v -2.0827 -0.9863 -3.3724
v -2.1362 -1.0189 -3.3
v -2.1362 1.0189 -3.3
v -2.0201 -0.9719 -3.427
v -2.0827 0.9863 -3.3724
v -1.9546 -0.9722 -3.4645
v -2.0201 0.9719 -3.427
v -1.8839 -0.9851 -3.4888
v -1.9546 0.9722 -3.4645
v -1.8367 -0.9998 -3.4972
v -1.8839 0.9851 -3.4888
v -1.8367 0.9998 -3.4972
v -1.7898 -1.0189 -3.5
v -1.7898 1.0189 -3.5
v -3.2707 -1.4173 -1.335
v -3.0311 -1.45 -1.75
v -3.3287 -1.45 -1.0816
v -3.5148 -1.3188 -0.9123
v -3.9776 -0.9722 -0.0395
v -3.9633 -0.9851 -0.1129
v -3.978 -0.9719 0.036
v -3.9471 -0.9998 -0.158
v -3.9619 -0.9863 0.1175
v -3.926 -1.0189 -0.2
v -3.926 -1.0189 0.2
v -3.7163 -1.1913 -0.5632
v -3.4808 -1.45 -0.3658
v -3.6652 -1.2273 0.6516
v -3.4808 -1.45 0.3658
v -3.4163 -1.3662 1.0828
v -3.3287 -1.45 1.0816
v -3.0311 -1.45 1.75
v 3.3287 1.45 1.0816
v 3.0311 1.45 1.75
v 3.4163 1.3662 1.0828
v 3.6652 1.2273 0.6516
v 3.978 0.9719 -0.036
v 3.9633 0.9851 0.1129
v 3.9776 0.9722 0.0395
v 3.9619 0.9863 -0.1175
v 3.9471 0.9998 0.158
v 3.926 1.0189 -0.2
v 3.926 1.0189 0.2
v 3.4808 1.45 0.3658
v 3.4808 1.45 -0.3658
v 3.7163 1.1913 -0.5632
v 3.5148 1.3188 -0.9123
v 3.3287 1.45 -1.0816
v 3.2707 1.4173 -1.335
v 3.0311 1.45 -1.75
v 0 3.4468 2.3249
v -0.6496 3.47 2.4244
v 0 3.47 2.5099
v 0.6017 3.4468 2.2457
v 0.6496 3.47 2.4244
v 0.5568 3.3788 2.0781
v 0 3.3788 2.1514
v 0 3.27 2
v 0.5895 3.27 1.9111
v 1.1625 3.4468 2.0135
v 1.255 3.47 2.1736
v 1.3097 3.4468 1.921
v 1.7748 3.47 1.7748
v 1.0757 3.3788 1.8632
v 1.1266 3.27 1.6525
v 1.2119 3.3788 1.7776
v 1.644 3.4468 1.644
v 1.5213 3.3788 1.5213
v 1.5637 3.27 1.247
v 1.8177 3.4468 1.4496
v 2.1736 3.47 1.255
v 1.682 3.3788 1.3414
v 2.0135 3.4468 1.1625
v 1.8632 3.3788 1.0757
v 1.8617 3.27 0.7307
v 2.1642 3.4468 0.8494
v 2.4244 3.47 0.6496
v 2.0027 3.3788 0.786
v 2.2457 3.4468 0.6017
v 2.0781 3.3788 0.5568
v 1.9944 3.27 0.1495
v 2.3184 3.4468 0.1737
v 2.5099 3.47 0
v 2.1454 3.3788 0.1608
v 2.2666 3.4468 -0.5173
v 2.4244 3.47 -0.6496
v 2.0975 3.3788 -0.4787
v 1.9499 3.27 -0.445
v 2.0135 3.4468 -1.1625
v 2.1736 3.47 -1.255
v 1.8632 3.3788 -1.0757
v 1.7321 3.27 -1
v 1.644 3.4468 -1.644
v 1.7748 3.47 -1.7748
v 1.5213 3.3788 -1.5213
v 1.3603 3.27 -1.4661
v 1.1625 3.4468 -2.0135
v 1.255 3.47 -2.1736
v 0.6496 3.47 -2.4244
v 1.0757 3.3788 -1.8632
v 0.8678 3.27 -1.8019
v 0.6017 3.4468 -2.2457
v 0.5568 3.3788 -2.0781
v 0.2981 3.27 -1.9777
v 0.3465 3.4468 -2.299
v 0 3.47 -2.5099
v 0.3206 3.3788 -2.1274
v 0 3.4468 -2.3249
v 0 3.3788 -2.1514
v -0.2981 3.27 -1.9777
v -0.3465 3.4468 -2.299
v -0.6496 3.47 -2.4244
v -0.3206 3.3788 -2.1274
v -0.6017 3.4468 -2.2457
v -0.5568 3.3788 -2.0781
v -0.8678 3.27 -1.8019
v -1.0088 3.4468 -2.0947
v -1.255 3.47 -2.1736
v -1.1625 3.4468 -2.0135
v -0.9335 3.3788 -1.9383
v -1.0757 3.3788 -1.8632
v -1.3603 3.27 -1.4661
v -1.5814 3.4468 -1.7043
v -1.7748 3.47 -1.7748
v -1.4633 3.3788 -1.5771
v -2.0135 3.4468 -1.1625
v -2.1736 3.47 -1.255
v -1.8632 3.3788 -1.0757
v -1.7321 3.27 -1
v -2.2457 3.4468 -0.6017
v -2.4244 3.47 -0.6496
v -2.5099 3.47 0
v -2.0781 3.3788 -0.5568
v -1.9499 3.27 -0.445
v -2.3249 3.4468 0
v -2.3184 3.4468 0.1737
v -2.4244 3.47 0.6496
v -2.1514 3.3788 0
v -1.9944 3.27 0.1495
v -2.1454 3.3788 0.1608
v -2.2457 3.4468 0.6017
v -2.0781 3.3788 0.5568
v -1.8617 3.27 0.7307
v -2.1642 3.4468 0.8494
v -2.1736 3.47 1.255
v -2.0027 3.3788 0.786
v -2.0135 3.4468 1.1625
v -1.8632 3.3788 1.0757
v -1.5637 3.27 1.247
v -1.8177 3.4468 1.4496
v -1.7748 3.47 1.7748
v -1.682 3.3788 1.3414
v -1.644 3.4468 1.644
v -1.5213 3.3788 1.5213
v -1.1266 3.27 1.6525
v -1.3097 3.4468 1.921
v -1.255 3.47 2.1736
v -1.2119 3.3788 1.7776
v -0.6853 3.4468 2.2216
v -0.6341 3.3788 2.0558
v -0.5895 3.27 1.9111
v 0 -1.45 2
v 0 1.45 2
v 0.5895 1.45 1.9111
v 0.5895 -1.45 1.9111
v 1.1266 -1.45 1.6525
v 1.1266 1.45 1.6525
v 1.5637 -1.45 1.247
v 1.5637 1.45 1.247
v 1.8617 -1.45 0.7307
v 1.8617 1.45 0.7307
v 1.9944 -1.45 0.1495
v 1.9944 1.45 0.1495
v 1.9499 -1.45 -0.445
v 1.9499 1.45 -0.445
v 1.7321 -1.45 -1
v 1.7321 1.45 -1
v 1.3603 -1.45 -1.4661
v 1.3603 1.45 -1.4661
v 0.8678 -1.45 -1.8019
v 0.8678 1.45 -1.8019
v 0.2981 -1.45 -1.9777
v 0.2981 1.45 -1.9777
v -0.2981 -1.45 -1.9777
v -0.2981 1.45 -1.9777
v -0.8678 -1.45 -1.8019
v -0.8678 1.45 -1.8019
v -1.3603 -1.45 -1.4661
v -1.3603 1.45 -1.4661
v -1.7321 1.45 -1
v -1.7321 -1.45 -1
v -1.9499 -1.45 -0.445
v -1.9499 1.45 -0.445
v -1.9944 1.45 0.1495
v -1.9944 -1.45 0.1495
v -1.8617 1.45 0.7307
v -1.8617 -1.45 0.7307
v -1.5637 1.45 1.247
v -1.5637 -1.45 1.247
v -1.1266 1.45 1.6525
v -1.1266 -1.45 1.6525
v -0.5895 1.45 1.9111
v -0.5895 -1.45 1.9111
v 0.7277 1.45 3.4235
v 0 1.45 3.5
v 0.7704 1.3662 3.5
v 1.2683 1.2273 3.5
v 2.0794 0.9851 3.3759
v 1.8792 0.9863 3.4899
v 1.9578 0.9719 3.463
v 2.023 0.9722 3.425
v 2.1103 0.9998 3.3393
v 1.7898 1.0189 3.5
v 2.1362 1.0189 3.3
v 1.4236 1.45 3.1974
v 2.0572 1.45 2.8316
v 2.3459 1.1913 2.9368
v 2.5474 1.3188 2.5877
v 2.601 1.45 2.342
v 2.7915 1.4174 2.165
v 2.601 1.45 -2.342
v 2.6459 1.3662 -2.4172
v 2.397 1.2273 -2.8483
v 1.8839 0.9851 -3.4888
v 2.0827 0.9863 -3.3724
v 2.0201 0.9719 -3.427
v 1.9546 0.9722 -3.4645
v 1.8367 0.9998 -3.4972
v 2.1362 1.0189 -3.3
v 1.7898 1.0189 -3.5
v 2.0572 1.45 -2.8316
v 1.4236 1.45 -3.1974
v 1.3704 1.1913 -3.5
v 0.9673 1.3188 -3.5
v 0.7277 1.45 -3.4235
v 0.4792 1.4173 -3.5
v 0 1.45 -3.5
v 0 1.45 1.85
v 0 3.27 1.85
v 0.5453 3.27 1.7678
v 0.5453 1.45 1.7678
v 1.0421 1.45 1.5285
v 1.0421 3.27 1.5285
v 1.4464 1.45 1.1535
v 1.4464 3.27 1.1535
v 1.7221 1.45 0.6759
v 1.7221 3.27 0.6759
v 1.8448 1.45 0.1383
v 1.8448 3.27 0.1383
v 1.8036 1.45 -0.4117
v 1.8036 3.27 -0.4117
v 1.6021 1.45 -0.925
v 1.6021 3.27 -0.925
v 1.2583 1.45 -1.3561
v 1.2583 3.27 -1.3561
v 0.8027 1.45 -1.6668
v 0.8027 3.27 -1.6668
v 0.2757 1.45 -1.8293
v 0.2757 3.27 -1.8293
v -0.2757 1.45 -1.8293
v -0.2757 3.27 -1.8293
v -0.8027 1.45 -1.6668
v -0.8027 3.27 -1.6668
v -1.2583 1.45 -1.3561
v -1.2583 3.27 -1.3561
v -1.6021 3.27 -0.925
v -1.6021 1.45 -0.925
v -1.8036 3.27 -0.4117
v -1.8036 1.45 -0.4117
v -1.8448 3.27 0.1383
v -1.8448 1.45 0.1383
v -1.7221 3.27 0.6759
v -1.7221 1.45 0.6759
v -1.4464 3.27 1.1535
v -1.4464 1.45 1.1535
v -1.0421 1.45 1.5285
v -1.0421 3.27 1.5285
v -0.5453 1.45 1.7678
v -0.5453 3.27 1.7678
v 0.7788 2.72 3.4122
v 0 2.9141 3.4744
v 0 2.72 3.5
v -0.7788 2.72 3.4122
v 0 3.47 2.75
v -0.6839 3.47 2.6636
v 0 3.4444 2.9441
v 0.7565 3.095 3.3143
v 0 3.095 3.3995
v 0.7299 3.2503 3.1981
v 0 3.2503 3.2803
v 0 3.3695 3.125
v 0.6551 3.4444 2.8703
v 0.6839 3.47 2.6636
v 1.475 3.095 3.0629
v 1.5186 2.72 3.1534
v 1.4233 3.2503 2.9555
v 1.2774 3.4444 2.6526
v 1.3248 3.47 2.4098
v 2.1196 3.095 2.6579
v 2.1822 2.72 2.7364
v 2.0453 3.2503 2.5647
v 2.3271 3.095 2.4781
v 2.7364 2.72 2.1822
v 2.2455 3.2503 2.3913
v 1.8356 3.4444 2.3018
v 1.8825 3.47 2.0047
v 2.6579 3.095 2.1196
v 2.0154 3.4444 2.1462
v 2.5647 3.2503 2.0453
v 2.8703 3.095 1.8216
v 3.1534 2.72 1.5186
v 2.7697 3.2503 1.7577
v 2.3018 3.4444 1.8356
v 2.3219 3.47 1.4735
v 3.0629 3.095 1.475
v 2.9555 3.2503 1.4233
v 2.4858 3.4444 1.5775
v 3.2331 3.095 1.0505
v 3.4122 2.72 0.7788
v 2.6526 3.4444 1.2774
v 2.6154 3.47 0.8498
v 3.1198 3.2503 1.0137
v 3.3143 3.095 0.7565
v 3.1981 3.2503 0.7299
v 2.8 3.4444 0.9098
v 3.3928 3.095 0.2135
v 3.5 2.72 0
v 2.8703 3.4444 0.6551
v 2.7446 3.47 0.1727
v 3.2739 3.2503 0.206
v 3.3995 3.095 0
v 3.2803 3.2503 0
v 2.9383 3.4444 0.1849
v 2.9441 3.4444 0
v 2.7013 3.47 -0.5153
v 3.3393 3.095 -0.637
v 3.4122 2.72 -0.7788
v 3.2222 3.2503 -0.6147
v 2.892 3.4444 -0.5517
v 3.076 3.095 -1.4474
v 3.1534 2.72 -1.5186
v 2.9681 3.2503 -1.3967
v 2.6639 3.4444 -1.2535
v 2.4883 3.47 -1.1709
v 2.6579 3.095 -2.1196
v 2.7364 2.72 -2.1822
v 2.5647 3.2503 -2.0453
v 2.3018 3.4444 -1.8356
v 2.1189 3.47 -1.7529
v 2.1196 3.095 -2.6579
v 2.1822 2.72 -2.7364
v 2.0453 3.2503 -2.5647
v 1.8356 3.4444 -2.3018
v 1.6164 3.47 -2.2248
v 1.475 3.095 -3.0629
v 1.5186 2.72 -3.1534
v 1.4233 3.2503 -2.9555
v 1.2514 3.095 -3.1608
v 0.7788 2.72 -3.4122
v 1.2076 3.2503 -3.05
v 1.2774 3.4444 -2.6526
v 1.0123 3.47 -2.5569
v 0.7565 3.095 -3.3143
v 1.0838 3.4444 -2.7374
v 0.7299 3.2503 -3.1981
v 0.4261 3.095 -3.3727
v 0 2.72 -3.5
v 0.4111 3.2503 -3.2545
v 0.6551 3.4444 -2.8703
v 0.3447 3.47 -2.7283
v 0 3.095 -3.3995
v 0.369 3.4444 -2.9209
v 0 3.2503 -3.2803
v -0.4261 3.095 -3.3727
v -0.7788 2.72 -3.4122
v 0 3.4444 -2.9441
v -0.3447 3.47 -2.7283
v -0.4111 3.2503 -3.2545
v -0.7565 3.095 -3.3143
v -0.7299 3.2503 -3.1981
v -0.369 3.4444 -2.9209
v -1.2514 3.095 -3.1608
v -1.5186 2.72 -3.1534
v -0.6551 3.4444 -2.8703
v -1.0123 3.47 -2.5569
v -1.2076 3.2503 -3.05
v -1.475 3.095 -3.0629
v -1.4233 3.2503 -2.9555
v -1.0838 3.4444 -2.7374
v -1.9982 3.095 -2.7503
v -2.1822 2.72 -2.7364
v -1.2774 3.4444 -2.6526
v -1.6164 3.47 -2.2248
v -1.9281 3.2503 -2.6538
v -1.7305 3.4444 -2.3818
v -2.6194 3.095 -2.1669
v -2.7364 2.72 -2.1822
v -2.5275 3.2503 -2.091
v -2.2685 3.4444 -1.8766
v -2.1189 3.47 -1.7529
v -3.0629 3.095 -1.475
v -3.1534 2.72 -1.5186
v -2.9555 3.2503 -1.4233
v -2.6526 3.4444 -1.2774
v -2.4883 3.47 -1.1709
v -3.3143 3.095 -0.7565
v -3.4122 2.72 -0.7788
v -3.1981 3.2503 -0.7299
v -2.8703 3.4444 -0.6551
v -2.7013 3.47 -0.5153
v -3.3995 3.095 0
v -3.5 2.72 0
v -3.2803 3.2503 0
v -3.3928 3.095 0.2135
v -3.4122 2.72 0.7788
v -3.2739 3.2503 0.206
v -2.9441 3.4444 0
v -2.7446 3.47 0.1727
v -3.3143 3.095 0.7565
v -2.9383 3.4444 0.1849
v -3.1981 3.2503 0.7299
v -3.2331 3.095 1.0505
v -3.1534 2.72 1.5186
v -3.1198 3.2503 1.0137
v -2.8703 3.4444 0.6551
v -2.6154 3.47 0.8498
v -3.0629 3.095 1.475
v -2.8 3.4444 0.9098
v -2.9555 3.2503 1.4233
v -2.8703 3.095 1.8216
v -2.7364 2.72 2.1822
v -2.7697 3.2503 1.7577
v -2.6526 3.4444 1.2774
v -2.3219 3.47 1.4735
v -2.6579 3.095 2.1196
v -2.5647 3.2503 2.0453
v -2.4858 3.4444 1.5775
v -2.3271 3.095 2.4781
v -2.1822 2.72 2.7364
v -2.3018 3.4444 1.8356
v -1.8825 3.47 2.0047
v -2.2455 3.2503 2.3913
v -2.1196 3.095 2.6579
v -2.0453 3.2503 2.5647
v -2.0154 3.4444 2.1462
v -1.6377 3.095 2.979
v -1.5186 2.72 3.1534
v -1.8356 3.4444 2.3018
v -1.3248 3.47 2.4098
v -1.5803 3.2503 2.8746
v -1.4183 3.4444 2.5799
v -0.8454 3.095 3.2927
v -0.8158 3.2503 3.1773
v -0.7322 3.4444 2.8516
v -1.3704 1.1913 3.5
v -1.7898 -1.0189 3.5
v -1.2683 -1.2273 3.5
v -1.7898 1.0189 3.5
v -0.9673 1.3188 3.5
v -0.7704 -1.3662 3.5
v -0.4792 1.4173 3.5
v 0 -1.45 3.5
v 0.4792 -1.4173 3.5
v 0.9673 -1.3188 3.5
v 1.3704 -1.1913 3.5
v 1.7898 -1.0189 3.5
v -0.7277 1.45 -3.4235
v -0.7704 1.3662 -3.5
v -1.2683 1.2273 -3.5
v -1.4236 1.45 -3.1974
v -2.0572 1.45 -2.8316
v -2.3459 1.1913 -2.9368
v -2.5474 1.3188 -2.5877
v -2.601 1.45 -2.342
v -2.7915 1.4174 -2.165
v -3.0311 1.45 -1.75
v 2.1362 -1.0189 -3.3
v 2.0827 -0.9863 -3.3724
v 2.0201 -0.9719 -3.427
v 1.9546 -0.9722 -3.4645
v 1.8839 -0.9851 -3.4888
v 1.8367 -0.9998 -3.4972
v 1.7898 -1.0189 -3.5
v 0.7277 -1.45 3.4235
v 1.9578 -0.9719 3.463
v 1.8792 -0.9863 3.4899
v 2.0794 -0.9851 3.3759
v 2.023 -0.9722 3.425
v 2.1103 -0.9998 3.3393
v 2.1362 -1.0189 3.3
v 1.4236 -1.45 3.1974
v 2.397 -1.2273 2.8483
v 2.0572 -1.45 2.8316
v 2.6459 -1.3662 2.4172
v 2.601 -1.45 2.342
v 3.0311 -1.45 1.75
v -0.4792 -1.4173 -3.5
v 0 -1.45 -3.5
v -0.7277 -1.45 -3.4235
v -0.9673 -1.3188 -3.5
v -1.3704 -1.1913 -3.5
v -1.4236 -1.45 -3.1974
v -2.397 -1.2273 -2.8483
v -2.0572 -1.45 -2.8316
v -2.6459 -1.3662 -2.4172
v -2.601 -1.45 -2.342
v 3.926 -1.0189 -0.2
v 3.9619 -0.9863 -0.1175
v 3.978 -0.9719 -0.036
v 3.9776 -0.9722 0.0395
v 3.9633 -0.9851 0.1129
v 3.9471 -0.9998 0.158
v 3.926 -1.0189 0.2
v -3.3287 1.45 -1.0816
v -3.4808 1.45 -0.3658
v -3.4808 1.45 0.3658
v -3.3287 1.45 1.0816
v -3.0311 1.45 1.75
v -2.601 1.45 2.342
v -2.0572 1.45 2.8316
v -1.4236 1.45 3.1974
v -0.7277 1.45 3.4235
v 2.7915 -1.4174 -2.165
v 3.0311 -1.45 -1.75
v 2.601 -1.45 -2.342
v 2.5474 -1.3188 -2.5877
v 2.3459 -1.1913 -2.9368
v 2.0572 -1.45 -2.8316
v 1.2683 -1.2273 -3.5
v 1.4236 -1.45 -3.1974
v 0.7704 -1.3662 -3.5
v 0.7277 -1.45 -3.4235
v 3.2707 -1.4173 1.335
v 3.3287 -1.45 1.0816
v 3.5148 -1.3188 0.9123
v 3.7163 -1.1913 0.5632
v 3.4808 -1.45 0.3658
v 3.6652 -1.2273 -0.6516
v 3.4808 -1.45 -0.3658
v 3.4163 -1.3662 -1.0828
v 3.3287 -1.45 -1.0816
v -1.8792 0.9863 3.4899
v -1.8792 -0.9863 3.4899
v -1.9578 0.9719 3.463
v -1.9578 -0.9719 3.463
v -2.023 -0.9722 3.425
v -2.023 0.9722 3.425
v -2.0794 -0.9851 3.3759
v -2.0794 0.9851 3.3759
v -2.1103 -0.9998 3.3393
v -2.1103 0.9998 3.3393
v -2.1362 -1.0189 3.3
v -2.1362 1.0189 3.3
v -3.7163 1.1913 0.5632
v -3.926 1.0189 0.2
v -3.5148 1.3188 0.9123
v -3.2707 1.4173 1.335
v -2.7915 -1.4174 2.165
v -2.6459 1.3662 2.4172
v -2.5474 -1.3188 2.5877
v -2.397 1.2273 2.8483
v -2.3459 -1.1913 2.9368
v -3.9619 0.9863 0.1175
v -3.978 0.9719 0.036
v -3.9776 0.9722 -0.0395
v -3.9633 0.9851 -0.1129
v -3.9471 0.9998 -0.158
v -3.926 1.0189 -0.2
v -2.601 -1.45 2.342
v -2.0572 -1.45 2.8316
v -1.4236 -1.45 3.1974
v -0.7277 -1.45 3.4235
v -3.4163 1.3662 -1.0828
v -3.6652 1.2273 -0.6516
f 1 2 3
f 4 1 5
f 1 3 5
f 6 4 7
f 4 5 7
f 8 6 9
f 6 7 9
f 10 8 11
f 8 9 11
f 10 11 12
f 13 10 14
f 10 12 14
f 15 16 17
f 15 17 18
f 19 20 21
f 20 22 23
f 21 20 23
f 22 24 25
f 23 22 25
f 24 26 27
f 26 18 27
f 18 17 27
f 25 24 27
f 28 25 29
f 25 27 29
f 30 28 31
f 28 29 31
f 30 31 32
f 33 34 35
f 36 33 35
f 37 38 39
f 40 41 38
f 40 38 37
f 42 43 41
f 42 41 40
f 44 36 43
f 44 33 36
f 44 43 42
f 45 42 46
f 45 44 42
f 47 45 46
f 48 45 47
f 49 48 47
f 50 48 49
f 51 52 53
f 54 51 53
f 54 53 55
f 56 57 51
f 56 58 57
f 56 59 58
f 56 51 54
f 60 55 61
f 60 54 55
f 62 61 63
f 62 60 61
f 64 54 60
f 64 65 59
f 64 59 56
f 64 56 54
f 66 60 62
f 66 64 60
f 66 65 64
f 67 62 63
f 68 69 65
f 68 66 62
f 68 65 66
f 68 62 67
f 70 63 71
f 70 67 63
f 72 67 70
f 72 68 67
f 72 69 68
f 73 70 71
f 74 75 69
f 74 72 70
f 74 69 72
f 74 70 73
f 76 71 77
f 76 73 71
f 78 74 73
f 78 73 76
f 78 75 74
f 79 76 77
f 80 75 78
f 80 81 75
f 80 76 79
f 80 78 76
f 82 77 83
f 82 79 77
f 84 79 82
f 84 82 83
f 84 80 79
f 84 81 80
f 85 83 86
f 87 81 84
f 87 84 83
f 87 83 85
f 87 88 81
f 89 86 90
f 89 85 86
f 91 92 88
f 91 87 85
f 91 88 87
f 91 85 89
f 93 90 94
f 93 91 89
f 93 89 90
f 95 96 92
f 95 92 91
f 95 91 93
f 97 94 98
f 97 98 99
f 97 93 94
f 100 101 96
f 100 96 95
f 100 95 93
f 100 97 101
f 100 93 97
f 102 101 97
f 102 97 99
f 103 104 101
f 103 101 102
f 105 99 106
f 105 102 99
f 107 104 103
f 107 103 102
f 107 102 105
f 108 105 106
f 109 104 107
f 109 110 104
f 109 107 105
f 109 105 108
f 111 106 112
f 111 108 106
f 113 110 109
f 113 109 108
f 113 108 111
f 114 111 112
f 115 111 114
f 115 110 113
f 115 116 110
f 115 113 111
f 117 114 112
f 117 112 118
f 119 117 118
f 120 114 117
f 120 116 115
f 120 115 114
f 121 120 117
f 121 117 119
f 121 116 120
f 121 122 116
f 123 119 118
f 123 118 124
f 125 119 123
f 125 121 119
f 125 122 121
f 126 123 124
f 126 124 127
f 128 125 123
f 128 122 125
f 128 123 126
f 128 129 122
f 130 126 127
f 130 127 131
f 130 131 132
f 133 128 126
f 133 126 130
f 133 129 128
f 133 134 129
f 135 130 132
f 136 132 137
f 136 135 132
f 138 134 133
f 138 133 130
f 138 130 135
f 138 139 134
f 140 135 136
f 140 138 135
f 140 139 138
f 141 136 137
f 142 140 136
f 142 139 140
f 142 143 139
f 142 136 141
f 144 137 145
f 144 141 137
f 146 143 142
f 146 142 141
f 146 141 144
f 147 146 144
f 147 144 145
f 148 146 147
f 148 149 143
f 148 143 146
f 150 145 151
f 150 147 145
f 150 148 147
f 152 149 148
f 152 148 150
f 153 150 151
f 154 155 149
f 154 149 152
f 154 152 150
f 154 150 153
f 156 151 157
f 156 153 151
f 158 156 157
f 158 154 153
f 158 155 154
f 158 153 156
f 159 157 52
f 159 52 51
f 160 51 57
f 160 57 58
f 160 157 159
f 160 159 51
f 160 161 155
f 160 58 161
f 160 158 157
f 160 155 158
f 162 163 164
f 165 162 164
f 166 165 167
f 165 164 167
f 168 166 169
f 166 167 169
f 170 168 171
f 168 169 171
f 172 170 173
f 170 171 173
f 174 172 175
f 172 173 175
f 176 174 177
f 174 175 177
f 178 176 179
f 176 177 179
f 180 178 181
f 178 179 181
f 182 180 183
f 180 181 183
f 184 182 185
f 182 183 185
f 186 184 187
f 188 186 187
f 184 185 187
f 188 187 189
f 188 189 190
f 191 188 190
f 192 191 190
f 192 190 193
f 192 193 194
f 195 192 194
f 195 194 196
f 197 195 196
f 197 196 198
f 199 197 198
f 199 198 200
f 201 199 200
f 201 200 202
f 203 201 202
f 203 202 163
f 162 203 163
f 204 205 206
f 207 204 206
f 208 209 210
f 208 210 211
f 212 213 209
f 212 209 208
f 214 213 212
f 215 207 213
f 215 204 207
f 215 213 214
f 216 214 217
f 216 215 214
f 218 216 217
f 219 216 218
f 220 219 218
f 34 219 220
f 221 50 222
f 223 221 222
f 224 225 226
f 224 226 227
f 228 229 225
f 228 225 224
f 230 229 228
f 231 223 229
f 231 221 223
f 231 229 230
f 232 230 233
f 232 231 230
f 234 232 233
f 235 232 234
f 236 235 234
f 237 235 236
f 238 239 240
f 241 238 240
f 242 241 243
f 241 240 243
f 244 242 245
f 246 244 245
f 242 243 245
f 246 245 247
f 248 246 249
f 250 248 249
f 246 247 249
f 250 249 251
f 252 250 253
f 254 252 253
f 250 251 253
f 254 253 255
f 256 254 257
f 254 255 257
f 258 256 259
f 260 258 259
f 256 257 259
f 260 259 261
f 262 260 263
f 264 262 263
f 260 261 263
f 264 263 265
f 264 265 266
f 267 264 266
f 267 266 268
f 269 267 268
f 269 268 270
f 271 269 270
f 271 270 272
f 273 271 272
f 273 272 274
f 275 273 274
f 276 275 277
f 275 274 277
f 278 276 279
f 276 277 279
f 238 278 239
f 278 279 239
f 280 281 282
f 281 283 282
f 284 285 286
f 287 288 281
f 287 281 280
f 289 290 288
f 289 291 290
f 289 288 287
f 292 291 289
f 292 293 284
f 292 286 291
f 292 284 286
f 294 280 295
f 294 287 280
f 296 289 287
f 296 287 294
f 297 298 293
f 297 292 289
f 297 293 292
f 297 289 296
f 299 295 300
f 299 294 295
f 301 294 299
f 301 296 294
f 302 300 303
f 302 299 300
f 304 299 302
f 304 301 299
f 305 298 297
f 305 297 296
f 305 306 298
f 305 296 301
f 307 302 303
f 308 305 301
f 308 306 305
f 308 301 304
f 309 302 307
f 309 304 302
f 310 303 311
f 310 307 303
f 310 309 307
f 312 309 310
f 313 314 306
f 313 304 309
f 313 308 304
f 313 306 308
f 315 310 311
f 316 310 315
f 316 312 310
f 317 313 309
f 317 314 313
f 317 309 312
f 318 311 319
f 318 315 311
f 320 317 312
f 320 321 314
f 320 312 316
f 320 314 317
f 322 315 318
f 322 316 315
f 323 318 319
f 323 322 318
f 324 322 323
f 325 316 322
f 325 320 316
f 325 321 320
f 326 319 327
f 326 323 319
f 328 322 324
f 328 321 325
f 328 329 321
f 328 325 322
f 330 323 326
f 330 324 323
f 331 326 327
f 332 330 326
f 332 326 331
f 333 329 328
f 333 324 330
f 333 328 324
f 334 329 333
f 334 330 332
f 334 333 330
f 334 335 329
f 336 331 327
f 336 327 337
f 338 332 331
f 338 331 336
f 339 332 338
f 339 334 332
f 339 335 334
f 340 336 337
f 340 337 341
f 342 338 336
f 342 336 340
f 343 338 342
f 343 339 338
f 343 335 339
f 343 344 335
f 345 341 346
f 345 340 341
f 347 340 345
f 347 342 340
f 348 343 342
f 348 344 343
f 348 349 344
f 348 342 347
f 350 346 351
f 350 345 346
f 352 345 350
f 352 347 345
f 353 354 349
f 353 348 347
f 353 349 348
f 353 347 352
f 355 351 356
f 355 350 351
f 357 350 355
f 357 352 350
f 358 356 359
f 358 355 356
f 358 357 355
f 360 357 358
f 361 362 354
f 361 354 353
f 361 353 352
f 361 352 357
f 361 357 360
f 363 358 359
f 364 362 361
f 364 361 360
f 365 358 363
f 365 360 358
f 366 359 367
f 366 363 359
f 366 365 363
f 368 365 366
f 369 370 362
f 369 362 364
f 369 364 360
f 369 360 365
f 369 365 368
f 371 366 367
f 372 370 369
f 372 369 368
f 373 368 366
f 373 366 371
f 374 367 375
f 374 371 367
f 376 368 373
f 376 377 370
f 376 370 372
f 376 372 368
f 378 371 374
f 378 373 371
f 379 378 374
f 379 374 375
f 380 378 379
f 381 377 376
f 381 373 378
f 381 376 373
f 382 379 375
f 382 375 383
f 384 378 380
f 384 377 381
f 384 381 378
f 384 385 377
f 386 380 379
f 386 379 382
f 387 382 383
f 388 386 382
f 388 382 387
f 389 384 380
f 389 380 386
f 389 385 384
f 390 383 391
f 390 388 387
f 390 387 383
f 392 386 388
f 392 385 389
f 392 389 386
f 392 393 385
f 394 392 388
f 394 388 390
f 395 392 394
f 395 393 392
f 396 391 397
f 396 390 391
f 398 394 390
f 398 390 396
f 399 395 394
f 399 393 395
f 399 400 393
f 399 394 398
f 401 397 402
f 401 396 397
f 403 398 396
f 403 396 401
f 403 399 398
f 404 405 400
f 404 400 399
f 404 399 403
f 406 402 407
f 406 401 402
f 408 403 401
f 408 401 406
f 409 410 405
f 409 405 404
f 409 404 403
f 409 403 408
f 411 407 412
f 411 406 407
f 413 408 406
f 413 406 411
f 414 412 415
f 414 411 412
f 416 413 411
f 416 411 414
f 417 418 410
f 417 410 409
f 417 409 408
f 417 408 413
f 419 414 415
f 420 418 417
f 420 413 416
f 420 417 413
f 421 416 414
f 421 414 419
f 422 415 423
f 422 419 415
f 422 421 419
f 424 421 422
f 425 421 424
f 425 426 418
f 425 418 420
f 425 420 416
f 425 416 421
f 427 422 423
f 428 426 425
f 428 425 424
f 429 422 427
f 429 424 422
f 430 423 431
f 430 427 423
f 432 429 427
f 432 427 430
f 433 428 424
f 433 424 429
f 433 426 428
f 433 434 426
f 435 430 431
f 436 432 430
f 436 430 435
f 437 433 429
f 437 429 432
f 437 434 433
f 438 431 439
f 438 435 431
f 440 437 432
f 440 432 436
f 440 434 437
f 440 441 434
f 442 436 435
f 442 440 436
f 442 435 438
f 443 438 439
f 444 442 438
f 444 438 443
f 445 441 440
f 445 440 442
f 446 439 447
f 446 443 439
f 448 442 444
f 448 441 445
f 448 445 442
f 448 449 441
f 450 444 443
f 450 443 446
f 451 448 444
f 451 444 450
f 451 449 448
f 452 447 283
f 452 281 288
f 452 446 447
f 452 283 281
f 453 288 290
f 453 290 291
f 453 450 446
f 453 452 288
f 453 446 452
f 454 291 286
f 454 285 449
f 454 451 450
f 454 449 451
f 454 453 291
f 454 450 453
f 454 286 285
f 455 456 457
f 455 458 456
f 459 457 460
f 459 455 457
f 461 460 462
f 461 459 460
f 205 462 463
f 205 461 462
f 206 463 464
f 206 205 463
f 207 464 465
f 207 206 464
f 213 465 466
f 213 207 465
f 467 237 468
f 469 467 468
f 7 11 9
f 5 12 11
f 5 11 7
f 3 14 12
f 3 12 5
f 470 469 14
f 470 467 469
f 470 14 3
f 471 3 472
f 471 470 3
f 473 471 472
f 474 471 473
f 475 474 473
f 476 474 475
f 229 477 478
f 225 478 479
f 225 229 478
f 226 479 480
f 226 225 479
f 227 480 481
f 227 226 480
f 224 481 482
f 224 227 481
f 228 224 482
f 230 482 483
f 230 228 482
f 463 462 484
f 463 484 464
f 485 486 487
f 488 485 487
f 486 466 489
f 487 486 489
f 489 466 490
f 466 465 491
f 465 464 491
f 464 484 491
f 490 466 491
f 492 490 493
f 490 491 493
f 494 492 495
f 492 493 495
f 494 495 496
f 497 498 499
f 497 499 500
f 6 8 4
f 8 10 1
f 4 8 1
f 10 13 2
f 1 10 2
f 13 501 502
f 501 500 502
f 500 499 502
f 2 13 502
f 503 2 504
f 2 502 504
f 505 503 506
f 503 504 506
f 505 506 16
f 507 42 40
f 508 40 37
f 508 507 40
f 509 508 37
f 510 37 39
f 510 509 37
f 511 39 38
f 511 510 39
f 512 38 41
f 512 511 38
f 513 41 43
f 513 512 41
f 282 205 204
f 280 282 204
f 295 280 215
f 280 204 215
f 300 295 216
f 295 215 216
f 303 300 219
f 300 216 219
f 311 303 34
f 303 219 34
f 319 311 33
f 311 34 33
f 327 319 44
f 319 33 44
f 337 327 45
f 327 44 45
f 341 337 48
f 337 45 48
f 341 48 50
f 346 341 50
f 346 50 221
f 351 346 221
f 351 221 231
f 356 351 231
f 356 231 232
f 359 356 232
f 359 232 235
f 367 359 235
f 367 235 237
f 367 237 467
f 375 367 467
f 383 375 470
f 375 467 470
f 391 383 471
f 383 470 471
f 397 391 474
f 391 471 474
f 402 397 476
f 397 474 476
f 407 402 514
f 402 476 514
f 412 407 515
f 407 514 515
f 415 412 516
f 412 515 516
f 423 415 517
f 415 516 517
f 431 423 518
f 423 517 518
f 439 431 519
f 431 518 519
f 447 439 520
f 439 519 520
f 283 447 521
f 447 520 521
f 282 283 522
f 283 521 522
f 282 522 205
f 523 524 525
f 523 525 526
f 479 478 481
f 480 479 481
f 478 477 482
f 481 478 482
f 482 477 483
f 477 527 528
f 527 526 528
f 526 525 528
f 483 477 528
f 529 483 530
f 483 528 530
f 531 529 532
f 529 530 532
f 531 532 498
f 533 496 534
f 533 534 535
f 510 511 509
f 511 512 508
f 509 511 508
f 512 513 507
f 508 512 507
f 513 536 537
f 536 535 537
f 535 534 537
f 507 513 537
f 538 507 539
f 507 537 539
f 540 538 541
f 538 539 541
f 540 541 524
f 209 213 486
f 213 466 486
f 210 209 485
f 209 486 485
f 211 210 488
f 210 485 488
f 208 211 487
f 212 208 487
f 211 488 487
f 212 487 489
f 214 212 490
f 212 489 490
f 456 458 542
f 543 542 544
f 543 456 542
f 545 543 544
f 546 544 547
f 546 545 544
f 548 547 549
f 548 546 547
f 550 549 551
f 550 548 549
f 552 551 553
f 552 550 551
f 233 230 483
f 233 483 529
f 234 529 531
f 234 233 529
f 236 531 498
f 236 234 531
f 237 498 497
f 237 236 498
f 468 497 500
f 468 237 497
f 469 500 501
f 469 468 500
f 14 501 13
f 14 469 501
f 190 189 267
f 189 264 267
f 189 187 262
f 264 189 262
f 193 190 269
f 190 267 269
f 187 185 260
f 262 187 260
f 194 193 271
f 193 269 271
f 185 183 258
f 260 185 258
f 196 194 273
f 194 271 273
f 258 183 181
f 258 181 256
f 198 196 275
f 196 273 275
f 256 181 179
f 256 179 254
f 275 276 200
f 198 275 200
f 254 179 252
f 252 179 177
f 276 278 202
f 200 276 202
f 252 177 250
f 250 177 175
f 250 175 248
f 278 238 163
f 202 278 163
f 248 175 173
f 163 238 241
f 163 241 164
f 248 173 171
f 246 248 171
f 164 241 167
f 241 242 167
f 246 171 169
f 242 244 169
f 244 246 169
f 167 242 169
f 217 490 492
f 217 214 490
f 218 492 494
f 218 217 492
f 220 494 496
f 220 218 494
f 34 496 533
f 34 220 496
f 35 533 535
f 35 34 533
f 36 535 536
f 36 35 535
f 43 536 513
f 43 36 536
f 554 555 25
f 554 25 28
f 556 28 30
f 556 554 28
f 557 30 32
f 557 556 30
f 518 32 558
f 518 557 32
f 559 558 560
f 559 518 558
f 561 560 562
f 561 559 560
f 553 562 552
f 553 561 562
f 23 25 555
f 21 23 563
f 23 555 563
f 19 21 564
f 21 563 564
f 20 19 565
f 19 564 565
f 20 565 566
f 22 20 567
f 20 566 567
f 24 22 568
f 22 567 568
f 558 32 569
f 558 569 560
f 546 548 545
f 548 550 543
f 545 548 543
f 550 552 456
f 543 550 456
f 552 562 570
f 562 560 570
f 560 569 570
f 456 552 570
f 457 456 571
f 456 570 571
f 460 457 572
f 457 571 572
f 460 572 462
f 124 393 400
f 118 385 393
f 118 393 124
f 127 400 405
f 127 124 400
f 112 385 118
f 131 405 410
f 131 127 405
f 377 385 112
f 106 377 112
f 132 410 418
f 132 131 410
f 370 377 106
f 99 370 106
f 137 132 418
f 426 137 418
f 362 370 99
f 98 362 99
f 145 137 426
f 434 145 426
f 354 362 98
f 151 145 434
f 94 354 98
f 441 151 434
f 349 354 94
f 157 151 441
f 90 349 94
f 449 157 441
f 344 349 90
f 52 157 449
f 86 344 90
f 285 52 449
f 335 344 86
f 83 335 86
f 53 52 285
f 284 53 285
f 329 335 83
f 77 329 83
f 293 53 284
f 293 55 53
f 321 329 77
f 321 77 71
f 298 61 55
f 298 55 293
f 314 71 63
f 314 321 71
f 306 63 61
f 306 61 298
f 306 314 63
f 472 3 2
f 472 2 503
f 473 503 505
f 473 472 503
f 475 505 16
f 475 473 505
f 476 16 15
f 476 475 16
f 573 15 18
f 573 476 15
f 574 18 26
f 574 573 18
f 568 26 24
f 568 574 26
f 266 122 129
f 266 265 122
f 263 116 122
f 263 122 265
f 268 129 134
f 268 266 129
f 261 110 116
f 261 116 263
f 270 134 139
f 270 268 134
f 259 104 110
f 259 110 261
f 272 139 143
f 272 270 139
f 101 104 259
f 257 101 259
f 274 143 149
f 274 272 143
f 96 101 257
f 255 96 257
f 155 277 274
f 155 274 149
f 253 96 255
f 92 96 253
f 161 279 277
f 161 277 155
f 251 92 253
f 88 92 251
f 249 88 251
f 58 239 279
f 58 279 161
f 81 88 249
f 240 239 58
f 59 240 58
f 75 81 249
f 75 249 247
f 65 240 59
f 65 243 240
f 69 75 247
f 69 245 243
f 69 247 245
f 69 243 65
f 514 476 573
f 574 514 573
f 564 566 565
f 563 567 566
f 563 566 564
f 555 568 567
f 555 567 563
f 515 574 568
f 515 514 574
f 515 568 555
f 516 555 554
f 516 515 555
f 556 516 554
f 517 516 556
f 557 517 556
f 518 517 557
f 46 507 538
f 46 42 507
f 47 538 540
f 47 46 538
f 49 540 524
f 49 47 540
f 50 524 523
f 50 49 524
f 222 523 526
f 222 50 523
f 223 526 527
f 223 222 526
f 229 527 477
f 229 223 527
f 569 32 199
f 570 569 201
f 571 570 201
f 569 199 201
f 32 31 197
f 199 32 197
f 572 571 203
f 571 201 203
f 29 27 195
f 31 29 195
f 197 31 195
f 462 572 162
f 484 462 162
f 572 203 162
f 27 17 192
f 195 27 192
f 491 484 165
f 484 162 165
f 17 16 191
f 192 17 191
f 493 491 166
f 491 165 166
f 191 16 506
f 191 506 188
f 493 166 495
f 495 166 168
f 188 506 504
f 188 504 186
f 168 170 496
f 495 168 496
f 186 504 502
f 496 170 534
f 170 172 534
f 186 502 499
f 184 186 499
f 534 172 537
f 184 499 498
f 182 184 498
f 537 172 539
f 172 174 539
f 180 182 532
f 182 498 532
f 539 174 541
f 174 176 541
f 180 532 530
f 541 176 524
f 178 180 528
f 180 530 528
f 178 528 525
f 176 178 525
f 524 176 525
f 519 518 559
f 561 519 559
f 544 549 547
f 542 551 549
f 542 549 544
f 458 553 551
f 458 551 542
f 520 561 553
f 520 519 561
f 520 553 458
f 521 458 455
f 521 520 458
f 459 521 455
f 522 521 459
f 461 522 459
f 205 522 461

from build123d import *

# Parameters (mm, degrees)
EXTRUDE_1_DEPTH     = 1.45
SKETCH_3_R          = 3.5
EXTRUDE_2_DEPTH     = 2.02
SKETCH_4_R          = 2
CUT_EXTRUDE_1_DEPTH = 8.265654364
EXTRUDE_START       = -0.2
SKETCH_5_R          = 2
SKETCH_5_R_2        = 1.85
EXTRUDE_3_DEPTH     = 1.82
FILLET_1_R          = 0.75
FILLET_3_R          = 0.4


with BuildPart() as part:
    # 草图1 → 凸台-拉伸1 (new, symmetric)
    with BuildSketch(Plane(origin=(0, 0, 0), x_dir=(1, 0, 0), z_dir=(0, 1, 0))):
        Polygon((4.041451884, 0), (2.020725942, 3.5), (-2.020725942, 3.5), (-4.041451884, 0), (-2.020725942, -3.5), (2.020725942, -3.5), align=None)
    extrude(amount=EXTRUDE_1_DEPTH, both=True)

    # 草图3 → 凸台-拉伸2 (add)
    with BuildSketch(Plane(origin=(0, 1.45, 0), x_dir=(1, 0, 0), z_dir=(0, 1, 0))):
        with Locations(Location((0, 0, 0), (0, 0, 270))):
            Circle(SKETCH_3_R)
    extrude(amount=EXTRUDE_2_DEPTH)

    # 草图4 → 切除-拉伸1 (cut, through all)
    with BuildSketch(Plane(origin=(0, 3.47, 0), x_dir=(1, 0, 0), z_dir=(0, 1, 0))):
        with Locations(Location((0, 0, 0), (0, 0, 270))):
            Circle(SKETCH_4_R)
    extrude(amount=-CUT_EXTRUDE_1_DEPTH, mode=Mode.SUBTRACT)

    # 草图5 → 凸台-拉伸3 (add)
    with BuildSketch(Plane(origin=(0, 3.47, 0), x_dir=(1, 0, 0), z_dir=(0, 1, 0)).offset(EXTRUDE_START)):
        with Locations(Location((0, 0, 0), (0, 0, 270))):
            Circle(SKETCH_5_R)
        with Locations(Location((0, 0, 0), (0, 0, 270))):
            Circle(SKETCH_5_R_2, mode=Mode.SUBTRACT)
    extrude(amount=-EXTRUDE_3_DEPTH)

    # 圆角1
    # the kernel refuses this fillet: 0.75 mm, written as the material it takes off along each edge
    with BuildSketch(Plane(origin=(0, 3.47, 0), x_dir=(0, 0, 1), z_dir=(-1, 0, 0))) as fillet_1_piece_1:
        with BuildLine():
            CenterArc((3.5 - FILLET_1_R, -FILLET_1_R), FILLET_1_R, 0, 90)
            Line((3.5 - FILLET_1_R, 0), (3.5 - FILLET_1_R, FILLET_1_R * 0.02))
            Line((3.5 - FILLET_1_R, FILLET_1_R * 0.02), (3.5 + FILLET_1_R * 0.02, FILLET_1_R * 0.02))
            Line((3.5 + FILLET_1_R * 0.02, FILLET_1_R * 0.02), (3.5 + FILLET_1_R * 0.02, -FILLET_1_R))
            Line((3.5 + FILLET_1_R * 0.02, -FILLET_1_R), (3.5, -FILLET_1_R))
        make_face()
    revolve(axis=Axis((0, 3.47, 0), (0, 1, 0)), mode=Mode.SUBTRACT)
    with BuildSketch(Plane(origin=(0, 3.47, 0), x_dir=(0, 0, 1), z_dir=(-1, 0, 0))) as fillet_1_piece_2:
        with BuildLine():
            CenterArc((2.509901951, -0.75), FILLET_1_R, 90, 42.833428066)
            Line((2, -0.2), (1.989801961, -0.189))
            ThreePointArc((1.989801961, -0.189), (1.985, -0.1), (1.985, 0))
            Line((1.985, 0), (2, 0.015))
            Line((2, 0.015), (2.509901951, 0.015))
            Line((2.509901951, 0.015), (2.509901951, 0))
        make_face()
    revolve(axis=Axis((0, 3.47, 0), (0, 1, 0)), mode=Mode.SUBTRACT)

    # 草图6 → 切除-旋转1 (revolve, cut)
    with BuildSketch(Plane.XY):
        Polygon((-4.041451884, 1.45), (-4.041451884, 0.908548116), (-3.5, 1.45), align=None)
        Polygon((-4.041451884, -1.45), (-4.041451884, -0.908548116), (-3.5, -1.45), align=None)
    revolve(axis=Axis((0, -1000, 0), (0, 1, 0)), mode=Mode.SUBTRACT)

    # 圆角3
    fillet_3_edges = [part.edges().sort_by_distance(p)[0] for p in [
        (-4.041451884, 0, 0),
        (-2.020725942, 0, -3.5),
        (2.020725942, 0, -3.5),
        (4.041451884, 0, 0),
        (2.020725942, 0, 3.5),
        (-2.020725942, 0, 3.5),
    ]]
    fillet(fillet_3_edges, radius=FILLET_3_R)


solid = part.part
